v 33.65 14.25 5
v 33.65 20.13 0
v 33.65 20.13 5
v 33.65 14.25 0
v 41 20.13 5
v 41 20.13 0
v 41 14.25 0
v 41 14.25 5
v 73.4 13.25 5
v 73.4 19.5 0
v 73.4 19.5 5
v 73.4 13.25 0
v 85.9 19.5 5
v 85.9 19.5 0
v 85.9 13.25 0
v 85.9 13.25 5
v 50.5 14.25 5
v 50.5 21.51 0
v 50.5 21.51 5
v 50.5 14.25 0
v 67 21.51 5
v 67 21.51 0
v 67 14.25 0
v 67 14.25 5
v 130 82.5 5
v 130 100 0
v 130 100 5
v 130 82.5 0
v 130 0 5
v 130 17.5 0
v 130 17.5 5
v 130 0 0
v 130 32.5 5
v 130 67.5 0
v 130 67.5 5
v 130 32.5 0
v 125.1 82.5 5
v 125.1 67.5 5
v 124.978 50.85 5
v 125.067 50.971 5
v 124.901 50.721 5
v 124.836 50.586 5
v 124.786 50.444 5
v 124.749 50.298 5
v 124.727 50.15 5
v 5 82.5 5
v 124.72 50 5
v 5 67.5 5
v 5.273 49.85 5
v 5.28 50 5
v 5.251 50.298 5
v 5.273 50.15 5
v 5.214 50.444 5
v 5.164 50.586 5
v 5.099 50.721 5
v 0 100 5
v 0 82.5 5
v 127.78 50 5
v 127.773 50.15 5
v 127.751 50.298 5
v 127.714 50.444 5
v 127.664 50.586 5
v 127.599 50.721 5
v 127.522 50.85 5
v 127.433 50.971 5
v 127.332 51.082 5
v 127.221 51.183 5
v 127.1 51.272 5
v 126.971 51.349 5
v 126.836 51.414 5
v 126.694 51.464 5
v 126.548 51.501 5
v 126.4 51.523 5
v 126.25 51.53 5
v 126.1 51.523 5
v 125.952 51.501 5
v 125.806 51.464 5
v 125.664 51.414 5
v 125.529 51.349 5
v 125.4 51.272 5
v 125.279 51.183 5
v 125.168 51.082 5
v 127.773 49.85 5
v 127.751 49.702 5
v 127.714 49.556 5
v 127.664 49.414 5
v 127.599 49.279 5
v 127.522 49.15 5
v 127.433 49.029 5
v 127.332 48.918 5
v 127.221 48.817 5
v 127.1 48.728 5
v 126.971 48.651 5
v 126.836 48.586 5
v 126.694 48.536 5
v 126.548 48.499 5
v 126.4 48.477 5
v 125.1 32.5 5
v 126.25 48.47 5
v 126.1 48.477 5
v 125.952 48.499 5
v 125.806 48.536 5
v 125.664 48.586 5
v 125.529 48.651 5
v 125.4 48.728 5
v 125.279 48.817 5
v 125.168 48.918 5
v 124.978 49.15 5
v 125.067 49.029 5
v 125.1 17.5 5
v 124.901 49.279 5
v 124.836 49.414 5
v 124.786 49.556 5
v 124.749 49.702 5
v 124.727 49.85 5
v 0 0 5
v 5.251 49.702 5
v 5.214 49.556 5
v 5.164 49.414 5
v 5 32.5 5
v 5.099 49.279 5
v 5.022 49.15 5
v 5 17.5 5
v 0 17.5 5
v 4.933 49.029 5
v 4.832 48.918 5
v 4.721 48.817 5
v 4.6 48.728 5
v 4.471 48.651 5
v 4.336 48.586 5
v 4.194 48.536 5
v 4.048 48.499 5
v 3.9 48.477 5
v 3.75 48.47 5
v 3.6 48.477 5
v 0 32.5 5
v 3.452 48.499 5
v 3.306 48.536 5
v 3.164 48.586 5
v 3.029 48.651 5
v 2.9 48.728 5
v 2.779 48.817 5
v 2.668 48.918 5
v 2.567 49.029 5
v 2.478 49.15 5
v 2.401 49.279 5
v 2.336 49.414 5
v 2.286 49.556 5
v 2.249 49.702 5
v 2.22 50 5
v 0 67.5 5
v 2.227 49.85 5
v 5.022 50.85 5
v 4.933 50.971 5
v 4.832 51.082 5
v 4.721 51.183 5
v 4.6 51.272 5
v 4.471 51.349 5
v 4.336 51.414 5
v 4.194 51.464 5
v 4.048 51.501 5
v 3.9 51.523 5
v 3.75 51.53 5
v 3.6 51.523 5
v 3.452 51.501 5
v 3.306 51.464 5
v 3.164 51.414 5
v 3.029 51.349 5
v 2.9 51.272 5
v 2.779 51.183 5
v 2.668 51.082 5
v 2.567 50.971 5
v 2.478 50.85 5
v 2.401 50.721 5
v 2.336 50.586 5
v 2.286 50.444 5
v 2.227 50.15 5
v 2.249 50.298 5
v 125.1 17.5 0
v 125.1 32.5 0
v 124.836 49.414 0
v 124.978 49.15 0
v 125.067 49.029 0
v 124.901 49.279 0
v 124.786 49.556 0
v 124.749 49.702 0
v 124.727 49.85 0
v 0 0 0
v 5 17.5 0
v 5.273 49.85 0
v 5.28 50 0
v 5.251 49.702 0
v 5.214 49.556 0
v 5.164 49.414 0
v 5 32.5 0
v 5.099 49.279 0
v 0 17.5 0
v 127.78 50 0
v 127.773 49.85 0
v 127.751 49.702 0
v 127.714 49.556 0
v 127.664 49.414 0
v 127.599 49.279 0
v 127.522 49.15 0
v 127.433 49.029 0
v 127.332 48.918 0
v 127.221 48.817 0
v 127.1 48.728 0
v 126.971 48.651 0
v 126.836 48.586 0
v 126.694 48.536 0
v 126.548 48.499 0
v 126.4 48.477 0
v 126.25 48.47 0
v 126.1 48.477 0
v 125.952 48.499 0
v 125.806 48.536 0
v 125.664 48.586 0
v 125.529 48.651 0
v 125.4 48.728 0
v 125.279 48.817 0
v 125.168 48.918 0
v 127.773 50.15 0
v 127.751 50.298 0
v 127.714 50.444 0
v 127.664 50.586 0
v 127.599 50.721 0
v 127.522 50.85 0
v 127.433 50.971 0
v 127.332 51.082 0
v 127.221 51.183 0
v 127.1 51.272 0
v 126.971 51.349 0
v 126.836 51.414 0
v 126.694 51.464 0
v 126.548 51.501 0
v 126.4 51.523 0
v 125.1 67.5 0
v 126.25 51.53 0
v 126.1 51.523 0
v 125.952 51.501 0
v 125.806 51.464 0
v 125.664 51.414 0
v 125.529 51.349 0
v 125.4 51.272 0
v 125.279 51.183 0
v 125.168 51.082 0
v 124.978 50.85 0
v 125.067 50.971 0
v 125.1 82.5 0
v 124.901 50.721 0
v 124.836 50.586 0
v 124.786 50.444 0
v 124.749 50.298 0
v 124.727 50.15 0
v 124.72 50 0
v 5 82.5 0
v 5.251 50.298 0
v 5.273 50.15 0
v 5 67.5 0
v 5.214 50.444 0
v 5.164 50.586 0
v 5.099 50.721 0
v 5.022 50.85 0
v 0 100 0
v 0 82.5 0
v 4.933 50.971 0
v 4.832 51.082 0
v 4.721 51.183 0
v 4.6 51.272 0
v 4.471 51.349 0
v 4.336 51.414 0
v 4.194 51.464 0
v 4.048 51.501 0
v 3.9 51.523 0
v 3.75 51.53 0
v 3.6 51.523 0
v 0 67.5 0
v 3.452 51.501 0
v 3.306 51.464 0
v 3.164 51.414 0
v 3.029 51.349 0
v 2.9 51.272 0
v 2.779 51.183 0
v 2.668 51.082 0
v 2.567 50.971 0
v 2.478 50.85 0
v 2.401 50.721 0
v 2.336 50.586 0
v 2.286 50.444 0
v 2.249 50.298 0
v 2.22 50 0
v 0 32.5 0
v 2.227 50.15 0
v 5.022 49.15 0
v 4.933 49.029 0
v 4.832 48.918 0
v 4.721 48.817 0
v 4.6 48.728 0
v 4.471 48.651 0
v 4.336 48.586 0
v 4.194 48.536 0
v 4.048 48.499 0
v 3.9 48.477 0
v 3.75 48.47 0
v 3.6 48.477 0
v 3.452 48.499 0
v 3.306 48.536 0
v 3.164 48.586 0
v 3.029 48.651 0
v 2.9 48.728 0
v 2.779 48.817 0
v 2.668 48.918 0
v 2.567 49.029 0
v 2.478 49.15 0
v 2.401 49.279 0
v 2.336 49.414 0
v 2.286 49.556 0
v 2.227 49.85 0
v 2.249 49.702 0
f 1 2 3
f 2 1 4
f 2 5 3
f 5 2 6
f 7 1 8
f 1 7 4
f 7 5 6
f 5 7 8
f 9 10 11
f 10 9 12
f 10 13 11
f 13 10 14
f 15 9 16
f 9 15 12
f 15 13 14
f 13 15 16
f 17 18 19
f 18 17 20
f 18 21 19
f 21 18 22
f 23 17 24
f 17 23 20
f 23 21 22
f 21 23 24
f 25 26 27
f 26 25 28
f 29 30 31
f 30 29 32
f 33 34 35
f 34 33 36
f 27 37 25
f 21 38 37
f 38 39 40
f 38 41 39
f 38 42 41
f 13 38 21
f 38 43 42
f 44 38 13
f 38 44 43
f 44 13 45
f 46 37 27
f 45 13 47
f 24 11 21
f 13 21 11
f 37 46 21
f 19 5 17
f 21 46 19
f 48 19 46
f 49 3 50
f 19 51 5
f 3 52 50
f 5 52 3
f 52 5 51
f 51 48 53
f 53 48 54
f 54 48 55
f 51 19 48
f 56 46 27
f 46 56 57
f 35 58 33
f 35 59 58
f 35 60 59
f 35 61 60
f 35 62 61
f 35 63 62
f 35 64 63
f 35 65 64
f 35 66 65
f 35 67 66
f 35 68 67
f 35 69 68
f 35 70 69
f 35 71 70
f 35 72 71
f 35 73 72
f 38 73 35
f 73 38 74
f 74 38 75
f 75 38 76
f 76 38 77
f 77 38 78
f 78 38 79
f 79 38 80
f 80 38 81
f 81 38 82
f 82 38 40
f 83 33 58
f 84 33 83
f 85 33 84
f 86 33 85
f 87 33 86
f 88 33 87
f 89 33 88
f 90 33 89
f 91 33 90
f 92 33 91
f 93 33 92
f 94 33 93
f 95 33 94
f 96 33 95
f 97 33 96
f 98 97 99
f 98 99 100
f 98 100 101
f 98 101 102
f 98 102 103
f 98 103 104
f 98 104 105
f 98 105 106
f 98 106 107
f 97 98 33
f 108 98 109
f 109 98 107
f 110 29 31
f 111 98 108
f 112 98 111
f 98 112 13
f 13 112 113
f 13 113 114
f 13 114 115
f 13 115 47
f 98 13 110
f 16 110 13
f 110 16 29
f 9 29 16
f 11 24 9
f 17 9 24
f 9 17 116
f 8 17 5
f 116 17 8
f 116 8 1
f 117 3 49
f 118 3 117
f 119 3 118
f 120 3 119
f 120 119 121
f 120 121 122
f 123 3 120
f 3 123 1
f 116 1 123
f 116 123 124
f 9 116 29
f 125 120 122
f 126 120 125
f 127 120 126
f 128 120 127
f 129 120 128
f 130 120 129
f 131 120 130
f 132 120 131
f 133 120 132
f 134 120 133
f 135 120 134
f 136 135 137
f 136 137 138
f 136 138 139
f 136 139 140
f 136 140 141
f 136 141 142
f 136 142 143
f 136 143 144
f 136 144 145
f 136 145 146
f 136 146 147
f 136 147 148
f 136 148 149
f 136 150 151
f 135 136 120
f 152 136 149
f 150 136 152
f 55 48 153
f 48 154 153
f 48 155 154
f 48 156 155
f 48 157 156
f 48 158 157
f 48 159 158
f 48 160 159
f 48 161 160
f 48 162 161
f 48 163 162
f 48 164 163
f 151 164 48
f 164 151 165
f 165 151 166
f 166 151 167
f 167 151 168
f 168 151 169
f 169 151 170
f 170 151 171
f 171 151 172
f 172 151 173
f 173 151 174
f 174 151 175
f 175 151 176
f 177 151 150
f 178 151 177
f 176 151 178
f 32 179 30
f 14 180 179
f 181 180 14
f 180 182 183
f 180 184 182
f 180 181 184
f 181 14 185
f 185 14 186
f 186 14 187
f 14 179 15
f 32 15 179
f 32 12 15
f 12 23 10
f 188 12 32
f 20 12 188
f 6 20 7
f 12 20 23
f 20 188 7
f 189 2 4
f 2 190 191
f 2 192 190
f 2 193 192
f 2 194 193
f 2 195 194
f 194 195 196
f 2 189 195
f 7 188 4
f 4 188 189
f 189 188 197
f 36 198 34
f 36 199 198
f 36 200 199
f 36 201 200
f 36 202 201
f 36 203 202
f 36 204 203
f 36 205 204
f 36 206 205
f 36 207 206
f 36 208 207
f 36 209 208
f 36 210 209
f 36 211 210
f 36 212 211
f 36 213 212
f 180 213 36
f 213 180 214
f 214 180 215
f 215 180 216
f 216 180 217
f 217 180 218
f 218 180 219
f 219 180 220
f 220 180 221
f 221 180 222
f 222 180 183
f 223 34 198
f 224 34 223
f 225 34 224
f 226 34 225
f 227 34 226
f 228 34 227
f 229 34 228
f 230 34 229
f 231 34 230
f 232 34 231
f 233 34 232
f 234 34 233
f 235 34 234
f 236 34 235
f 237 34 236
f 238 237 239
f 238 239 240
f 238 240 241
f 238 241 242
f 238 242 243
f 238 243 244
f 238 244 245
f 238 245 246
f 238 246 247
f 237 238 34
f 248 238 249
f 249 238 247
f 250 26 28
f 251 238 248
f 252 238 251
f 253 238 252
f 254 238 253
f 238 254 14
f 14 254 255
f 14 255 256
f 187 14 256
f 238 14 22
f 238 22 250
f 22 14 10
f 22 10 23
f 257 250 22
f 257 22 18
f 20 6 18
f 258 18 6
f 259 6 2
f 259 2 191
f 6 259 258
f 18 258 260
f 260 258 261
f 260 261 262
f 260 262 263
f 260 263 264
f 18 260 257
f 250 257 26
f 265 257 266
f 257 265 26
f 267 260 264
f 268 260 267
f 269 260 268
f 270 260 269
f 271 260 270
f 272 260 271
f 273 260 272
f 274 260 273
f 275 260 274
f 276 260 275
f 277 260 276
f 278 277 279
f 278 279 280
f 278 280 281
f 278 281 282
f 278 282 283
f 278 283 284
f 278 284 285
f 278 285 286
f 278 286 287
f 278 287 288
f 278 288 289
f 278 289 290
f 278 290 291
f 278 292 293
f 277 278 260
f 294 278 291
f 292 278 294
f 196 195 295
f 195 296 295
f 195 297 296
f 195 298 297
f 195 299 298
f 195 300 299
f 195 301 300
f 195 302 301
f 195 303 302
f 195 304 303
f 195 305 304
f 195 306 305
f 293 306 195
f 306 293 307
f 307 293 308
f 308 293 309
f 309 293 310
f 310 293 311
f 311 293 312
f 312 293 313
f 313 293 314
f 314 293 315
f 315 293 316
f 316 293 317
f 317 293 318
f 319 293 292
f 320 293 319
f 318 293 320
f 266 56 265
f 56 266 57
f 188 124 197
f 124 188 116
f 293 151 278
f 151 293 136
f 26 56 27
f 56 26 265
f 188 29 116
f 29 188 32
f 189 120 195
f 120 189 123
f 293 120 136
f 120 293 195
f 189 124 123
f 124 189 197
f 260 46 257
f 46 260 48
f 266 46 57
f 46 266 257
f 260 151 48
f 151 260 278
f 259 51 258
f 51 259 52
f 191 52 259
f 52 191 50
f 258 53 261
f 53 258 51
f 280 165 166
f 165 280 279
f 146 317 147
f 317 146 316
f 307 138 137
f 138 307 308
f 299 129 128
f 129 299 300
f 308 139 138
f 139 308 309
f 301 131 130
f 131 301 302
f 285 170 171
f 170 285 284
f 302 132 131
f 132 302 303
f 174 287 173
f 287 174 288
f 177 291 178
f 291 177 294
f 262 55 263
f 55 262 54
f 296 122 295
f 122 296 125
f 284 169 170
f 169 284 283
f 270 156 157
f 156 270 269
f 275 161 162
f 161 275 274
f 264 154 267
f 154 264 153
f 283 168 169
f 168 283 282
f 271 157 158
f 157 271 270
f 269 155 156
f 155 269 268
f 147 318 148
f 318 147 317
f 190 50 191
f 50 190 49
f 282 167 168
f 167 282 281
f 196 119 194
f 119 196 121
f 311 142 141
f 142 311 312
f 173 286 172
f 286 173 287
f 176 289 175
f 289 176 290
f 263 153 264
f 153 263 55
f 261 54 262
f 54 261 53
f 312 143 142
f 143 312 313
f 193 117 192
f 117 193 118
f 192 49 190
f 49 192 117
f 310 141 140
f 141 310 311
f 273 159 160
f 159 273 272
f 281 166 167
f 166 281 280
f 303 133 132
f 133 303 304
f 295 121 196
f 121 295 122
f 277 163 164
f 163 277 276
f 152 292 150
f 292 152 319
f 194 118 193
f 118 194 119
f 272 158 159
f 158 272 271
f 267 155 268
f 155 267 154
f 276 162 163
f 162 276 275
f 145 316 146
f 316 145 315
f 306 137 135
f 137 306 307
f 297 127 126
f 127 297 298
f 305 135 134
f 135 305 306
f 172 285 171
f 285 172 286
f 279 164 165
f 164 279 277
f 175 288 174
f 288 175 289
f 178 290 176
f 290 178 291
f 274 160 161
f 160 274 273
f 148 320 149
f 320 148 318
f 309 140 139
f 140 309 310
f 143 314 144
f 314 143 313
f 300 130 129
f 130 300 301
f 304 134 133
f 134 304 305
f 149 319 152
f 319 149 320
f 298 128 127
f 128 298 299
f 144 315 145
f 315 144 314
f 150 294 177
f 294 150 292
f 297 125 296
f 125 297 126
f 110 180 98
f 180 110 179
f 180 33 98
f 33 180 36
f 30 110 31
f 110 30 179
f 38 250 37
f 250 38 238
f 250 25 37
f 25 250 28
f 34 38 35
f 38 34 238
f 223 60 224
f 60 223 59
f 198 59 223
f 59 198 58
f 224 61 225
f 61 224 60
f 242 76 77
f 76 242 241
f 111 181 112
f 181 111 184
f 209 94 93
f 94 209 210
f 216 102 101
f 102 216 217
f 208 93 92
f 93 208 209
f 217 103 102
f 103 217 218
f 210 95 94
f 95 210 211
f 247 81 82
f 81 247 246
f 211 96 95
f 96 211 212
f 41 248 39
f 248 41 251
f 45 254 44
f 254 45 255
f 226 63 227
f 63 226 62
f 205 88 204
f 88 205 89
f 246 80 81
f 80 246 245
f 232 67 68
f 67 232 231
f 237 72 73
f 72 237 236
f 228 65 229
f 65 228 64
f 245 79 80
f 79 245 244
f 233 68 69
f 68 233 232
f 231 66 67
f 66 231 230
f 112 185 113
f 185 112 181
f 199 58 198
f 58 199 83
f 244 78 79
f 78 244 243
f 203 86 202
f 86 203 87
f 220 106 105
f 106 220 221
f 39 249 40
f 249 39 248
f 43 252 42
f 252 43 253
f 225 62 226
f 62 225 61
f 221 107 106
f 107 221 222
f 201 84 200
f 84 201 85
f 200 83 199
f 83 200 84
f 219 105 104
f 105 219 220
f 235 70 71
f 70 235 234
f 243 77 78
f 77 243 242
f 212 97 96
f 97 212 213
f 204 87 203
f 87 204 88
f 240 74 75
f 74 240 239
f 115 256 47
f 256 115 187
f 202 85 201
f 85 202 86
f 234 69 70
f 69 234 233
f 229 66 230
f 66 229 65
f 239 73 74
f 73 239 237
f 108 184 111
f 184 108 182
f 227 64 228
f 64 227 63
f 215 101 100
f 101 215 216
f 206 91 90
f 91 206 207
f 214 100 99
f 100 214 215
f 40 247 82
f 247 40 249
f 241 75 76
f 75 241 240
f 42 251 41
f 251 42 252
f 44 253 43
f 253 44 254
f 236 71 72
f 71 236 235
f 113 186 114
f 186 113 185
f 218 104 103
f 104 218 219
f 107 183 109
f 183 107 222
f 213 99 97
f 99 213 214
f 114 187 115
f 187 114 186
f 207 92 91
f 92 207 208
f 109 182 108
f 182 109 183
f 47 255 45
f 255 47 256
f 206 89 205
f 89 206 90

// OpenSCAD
// file: dimensions.scad
panel_thickness = 5;

bezel_width = 140;
bezel_height = 85;
bezel_corner_radius = 3;
bezel_screw_hole_dia = 3.5;
bezel_angle = 70; // degrees

tab_tolerance_coeff = 1.025;
tab_width = 15;

floor_width = bezel_width - (panel_thickness * 4);
floor_depth = 120;
floor_height_above_bottom = 10; 

sma_bulkhead_radius = 3.25;
sma_bulkhead_flat_radius = 3;

roof_width = 100;
roof_depth = 80;
roof_height_below_top = 5; 

side_height = 100;
side_depth  = floor_depth;
side_corner_radius = 1.5;
chin_depth = 42;


// Pi standoff holes
// All measurements taken from https://www.raspberrypi.org/documentation/hardware/raspberrypi/mechanical/rpi_MECH_3bplus.pdf
// Top left etc relative to drawing
// 0,0 of drawing is bottom left corner

pi_width = 85;
pi_depth = 56;
pi_hole_dia = 2.75;
pi_hole_radius = pi_hole_dia / 2;
standoff_dia = pi_hole_dia * 2;
standoff_radius = standoff_dia / 2;
standoff_height = 3;
pi_standoff_holes = [
    [3.5, 3.5],           // bottom left
    [3.5+58, 3.5],      // bottom right
    [3.5, 3.5+49],      // top left
    [3.5+58, 3.5+49], // top right
];


m3_bolt_thread_len = 8;
m3_bolt_dia = 3;
m3_bolt_clearance_coeff = 1.02;
m3_bolt_slot_dia = m3_bolt_dia * m3_bolt_clearance_coeff;
m3_bolt_slot_len = m3_bolt_thread_len + 1;
m3_nut_flats_dia = 5.5;
m3_nut_clearance_coeff = 1.025;
m3_nut_points_dia = 6;
m3_nut_depth = 2.5;
m3_nut_slot_width = ((m3_nut_flats_dia * m3_nut_clearance_coeff) - m3_bolt_slot_dia) * 2;
m3_nut_slot_depth = m3_nut_depth * m3_nut_clearance_coeff;
   
// main file
$fn = 64;

include <dimensions.scad>;

module av_power_connectors() {
    // micro USB
    translate([10.6-11/2,-1.5,-1]) scale([1.25, 1.25, 1.25]) cube([10,10,5]);

    // HDMI
    translate([32-16/2,-1.5,0]) scale([1.1, 1.1, 1.1]) cube([15,11.5,6.6]);

    color("darkgrey") {
        // Audio
        translate([53.5-7/2,-2,0]) {
            translate([0,2,0]) scale([1.05, 1.05, 1.05]) cube([7,13,5.6]);
            translate([7/2,0,5.6/2]) rotate([-90,0,0]) scale([1.05, 1.05, 1.05]) cylinder(d=5.6,h=2);
        }
    }
}

module back_panel() {
    difference() {
        cube([floor_width+(panel_thickness*2), side_height, panel_thickness]);
        translate([-0.1, (side_height/4)-(tab_width/2), -panel_thickness])
            cube([panel_thickness+0.1, tab_width, panel_thickness*3]);
        translate([-0.1, ((side_height/4)*3)-(tab_width/2), -panel_thickness])
            cube([panel_thickness+0.1, tab_width, panel_thickness*3]);
        translate([panel_thickness*0.75, (side_height/2), -panel_thickness])
            cylinder(r=m3_bolt_slot_dia/2, h=panel_thickness*3);
        
        translate([floor_width+panel_thickness+0.1, (side_height/4)-(tab_width/2), -panel_thickness])
            cube([panel_thickness+0.1, tab_width, panel_thickness*3]);
        translate([floor_width+panel_thickness+0.1, ((side_height/4)*3)-(tab_width/2), -panel_thickness])
            cube([panel_thickness+0.1, tab_width, panel_thickness*3]);
        translate([floor_width+(panel_thickness*1.25), (side_height/2), -panel_thickness])
            cylinder(r=m3_bolt_slot_dia/2, h=panel_thickness*3);

        translate([91, 14.25, -(panel_thickness/2)]) 
            rotate([270, 180, 0]) 
                av_power_connectors();

    }
}

back_panel();
